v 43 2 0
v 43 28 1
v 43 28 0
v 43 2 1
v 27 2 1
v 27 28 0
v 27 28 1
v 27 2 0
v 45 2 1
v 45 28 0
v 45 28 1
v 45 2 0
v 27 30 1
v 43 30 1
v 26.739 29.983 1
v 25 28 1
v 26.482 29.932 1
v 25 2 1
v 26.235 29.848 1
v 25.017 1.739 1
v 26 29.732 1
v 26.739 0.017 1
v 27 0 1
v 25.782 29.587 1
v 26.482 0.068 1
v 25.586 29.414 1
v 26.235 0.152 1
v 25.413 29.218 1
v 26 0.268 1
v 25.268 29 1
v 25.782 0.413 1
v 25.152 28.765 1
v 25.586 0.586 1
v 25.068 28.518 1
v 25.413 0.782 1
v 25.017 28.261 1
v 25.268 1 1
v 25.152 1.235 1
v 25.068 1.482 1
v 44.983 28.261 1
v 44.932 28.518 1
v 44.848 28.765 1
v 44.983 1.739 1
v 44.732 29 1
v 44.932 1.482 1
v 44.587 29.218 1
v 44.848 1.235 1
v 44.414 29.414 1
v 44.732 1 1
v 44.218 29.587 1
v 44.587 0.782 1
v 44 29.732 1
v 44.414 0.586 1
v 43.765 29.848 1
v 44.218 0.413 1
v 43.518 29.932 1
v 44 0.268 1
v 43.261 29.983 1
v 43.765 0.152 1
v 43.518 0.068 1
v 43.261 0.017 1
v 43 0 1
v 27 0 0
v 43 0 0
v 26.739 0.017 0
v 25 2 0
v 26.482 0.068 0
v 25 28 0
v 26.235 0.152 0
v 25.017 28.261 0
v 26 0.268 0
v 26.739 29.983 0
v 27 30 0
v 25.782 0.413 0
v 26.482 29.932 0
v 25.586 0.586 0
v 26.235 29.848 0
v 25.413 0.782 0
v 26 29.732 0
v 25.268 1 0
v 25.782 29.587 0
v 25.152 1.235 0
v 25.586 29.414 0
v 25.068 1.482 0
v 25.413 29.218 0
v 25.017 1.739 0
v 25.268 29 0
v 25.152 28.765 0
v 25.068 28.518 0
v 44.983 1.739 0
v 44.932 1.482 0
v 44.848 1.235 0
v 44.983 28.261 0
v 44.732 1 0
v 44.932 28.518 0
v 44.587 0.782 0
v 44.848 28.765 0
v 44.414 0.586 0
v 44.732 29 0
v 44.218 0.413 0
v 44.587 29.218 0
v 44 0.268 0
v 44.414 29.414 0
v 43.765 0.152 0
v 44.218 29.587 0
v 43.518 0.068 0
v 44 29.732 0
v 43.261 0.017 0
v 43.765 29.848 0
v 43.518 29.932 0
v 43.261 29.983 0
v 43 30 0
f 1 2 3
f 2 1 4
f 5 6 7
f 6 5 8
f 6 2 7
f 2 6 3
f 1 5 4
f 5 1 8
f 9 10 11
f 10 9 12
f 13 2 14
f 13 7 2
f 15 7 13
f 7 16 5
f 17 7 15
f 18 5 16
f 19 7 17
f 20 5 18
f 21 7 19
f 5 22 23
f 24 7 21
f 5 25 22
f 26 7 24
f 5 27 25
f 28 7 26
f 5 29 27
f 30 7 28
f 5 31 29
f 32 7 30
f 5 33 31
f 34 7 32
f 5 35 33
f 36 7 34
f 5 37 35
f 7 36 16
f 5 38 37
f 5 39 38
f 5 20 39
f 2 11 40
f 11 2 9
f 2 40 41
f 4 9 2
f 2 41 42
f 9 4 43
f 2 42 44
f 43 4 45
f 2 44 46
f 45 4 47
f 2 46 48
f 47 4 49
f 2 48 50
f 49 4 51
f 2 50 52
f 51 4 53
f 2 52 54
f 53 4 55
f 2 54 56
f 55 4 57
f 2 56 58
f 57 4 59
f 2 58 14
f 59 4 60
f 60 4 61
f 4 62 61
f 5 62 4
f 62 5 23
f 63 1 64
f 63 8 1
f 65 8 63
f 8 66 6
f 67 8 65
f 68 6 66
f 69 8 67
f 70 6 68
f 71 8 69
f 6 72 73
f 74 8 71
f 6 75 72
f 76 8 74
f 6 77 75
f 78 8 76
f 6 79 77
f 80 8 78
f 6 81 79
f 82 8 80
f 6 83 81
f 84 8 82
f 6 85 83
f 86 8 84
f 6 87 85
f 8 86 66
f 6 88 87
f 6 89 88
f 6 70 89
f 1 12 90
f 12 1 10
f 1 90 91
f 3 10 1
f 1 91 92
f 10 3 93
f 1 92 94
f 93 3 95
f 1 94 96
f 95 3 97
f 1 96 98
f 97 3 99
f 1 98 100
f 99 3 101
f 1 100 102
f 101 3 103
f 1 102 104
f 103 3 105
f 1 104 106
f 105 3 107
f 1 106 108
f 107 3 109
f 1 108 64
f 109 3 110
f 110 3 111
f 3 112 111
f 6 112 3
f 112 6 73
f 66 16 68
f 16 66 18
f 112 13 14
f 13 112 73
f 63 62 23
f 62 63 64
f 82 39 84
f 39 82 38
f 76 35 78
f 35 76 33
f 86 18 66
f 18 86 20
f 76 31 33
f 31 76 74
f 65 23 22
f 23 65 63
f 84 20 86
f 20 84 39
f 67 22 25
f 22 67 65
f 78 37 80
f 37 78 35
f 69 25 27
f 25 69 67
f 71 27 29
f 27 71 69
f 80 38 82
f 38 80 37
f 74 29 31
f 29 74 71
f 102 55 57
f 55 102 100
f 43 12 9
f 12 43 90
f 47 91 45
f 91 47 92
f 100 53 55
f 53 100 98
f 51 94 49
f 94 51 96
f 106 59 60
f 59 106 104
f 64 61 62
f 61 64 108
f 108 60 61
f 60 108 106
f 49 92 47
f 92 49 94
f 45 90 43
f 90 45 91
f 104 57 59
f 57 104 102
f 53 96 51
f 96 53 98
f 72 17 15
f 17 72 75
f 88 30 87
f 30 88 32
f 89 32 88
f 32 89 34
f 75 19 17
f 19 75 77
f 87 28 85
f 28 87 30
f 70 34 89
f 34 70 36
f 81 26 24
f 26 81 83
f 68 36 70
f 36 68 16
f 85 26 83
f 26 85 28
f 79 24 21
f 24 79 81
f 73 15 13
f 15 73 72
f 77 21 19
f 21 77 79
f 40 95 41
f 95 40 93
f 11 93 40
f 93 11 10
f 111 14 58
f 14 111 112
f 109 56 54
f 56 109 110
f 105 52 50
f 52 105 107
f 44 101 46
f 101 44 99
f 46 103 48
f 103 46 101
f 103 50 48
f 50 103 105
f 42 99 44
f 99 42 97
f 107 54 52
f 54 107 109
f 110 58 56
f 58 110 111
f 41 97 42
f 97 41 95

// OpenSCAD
// minimum angle
$fa = 1;
// minimum size
$fs = 0.4;
// number of fragments 
$fn = 48;

// use <sector.scad>;

// cylindersector(50, 10, 10, a1=0, a2="", tolerance=0) ;
    
// translate([+86,+40,0]) frame(20,30, height=1, inset=0, cornerspace=8, cornerarch=true, cornerinsidearch=false);

// translate([-25,0,0]) frame(20,30, thickness=1, height=1, inset=0, cornerspace=0, cornerarch=false, cornerinsidearch=false);

// frame(20,30, thickness=1, height=1, inset=0, cornerspace=2, cornerarch=false, cornerinsidearch=false);

// When the thickness gets too large, a tiny amount is left in the centre of the circle and causes a rendering error.
translate([25,0,0]) frame(20,30, thickness=2, height=1, inset=0, cornerspace=2, cornerarch=true, cornerinsidearch=true);

// translate([50,0,0]) frame(20,30, thickness=3, height=1, inset=0, cornerspace=6, cornerarch=true, cornerinsidearch=true);

// translate([-25,40,0]) frame(20,30, thickness=1, height=1, inset=3, cornerspace=0, cornerarch=false, cornerinsidearch=false);

// translate([0,40,0]) frame(20,30, thickness=1, height=1, inset=3, cornerspace=2, cornerarch=false, cornerinsidearch=false);

// translate([25,40,0]) frame(20,30, thickness=1, height=1, inset=3, cornerspace=2, cornerarch=true, cornerinsidearch=false);

// translate([50,40,0]) frame(20,30, thickness=3, height=1, inset=3, cornerspace=6, cornerarch=true, cornerinsidearch=true);


module frame(x,y,thickness="", height=1, inset=0, cornerspace=2, cornerarch=true, cornerinsidearch=false) {  
    if (thickness != "" && thickness>cornerspace) {
    echo("you'll get errors in rendering.");
        // When the thickness gets too large, a tiny amount is left in the centre of the circle and causes a rendering error.

    };
    XX=x-2*inset;
    YY=y-2*inset;
    translate([inset,inset,0]) {
    difference() {
        union() {
            difference() {
                cube([XX, YY,height]);
                //translate([-1,-1,-1]) cube([thickness+1,thickness+1,height+2]);                   
            };
        };
        union() {
            if (thickness != "") {
            // cut the middle frame
            translate([thickness, thickness, -5]) 
            cube([
                XX-2*thickness,
                YY-2*thickness,
                height+10]);
            };
            //cut edges
            if (cornerspace>0) {
                rectangleOfCubes(XX, YY, z=10, d=cornerspace, dx=0, dy=0, 
                n=4, ddx=0, ddy=0, inch=false);          
            };
        };
    };
    if (cornerarch && cornerspace>0) {
       // translate([inset,inset,0]) color("red") difference() {
                // cylinder(r=1,h=height);
                // cube([thickness,thickness,height+1]); 
        makeTubes();
    };    
    };
    module makeTubes() {
        rectangleOfTubes(XX, YY, z=height, d=cornerspace, d2=(cornerinsidearch? cornerspace-thickness : 0), dx=0, dy=0, 
                n=4, ddx=0, ddy=0, inch=false);    
    };
};
// tube(savequadrant=3,center=false,r=4,wall=1, h=1);


module rectangleOfTubes(x, y, z=10, d=2.5, d2=1, dx=0, dy=0, n=4, ddx=0, ddy=0, inch=false) {
    rectangleOfObjects(x, y, z=z, d=d, d2=d2, dx=dx, dy=dy, n=n, ddx=ddx, ddy=ddy, inch=inch, type="tube");
};

module rectangleOfCubes(x, y, z=10, d=2.5, dx=0, dy=0, n=4, ddx=0, ddy=0, inch=false) {
    rectangleOfObjects(x, y, z=z, d=d, dx=dx, dy=dy, n=n, ddx=ddx, ddy=ddy, inch=inch, type="cube");
};

module rectangleOfCylinders(x, y, z=10, d=2.5, dx=0, dy=0, n=4, ddx=0, ddy=0, inch=false) {
    rectangleOfObjects(x, y, z=z, d=d, dx=dx, dy=dy, n=n, ddx=ddx, ddy=ddy, inch=inch, type="cylinder");
};


module rectangleOfObjects(x, y, z=10, d=2.5, dx=0, dy=0, n=4, ddx=0, ddy=0, inch=false, type="cylinder", d2=1) {
/*
    x,y: size of board (specify hole offset with dx, dy)
         or: size of rectangle of holes (dx=dy=0)
             specifiy offset with ddx, ddy.
    n:   number of cylinders to make
    inch: values for x,y,dx,dy,ddx,ddy are specified in tenth of inch.
    d:   diameter of cylinders (always in mm)
    z:   height of cylinder (always in mm)
*/    
    if (inch) {
        inch=25.4/10;
        makeSet(x*inch, y*inch, 
            z=z, d=d, 
            dx=dx*inch, 
            dy=(dy>0 ? dy*inch : dx*inch),
            n=n, 
            ddx=ddx*inch, 
            ddy=(ddy>0 ? ddy*inch : ddx*inch),
            type=type
        );
    } else {
        makeSet(x, y, z=z, d=d, 
        dx=dx, 
        dy=(dy>0 ? dy : dx),
        n=n, 
        ddx=ddx, 
        ddy=(ddy>0 ? ddy : ddx),
        type=type
        );
    };

    module makeSet(x, y, z=10, d=2.5, dx=0, dy=0, n=4, ddx=0, ddy=0,type="cylinder") {
        translate([ddx,ddy,-z/2]) {
            translate([0+dx,0+dy,0]) makeObject(0,0) ; 
            if (n>1)
                translate([x-dx,0+dy,0]) makeObject(1,0) ; 
            if (n>2)
                translate([0+dx,y-dy,0]) makeObject(0,1) ; 
            if (n>3)
                translate([x-dx,y-dy,0]) makeObject(1,1) ; 
        };

        module makeObject(xo=0,yo=0) {
            if (type=="cylinder")
                cylinder(z, r=d/2); 
            if (type=="cube")
                translate([0,0,z/2]) cube([2*d,2*d,z],center=true);
            if (type=="tube")
                translate([-xo*2*d,-yo*2*d,z/2]) tube(r=d, s=d2, h=z, center=false, xo=xo, yo=yo);            
        };

    };
};

module tube_old(
    h=10,r1="undef", r2="undef", r=2,
    h2="undef", s1="undef", s2="undef", s="",
    center=true, cutquadrant=0, savequadrant=0, wall="",
    xo=0, yo=0
    ) {
        tolerance=1;
        ttolerance=2;
        quadrantarray = [[3,2],[4,1]];
        savequadrant = quadrantarray[xo][yo];
    translate([center ? 0 : r, center ? 0 : r,0]) difference() {
        cylinder(
            h, r1=(r1 != "undef" ? r1 : r), r2=(r2 != "undef" ? r2 : r));
        union() {
            translate([0,0,-tolerance]) cylinder(
                (h2 != "undef"? h2 : h+ttolerance), 
                r1=(s1 != "undef" ? s1 : (s!=""? s : (wall!=""? r-wall : r/2))), 
                r2=(s2 != "undef" ? s2 : (s!=""? s : (wall!=""? r-wall : r/2)))
            );
            if (cutquadrant>0 || savequadrant>0) {
                cutquadrant();
            };
        };
    };
    module cutquadrant() {
        if (cutquadrant==1 || (savequadrant > 0 && savequadrant != 1))
        translate([-tolerance,0,-tolerance]) cube([r,r,h+ttolerance]) ;
        if (cutquadrant==2 || (savequadrant > 0 && savequadrant != 2))
        translate([-r,0,-tolerance]) cube([r,r,h+ttolerance]) ;
        if (cutquadrant==3 || (savequadrant > 0 && savequadrant != 3))
        translate([-r,-r,-tolerance]) cube([r,r,h+ttolerance]) ;
        if (cutquadrant==4 || (savequadrant > 0 && savequadrant != 4))
        translate([0,-r,-tolerance]) cube([r,r,h+ttolerance]) ;
    };
};

module tube(
    h=10,r1="undef", r2="undef", r=2,
    h2="undef", s1="undef", s2="undef", s="",
    center=true, cutquadrant=0, savequadrant=0, wall="",
    xo=0, yo=0
    ) {
        tolerance=1;
        ttolerance=2;
        // quadrantarray = [[3,2],[4,1]];
        // savequadrant = quadrantarray[xo][yo];
        quadrantarray = [[+2,1],[+3,+0]];
        savequadrant = quadrantarray[xo][yo];
        translate([center ? 0 : r, center ? 0 : r,0]) 
        difference() {
        cylindersector(
            h, r1=(r1 != "undef" ? r1 : r), r2=(r2 != "undef" ? r2 : r), 
            a1=90*savequadrant, tolerance=1);
        union() {
            translate([0,0,-tolerance]) cylindersector(
                (h2 != "undef"? h2 : h+ttolerance), 
                r1=(s1 != "undef" ? s1 : (s!=""? s : (wall!=""? r-wall : r/2))), 
                r2=(s2 != "undef" ? s2 : (s!=""? s : (wall!=""? r-wall : r/2))),
            a1=90*savequadrant, tolerance=+2
            );
            
        };
    };    
};

/*
module cutquadrant() {
        if (cutquadrant==1 || (savequadrant > 0 && savequadrant != 1))
        translate([-tolerance,0,-tolerance]) cube([r,r,h+ttolerance]) ;
        if (cutquadrant==2 || (savequadrant > 0 && savequadrant != 2))
        translate([-r,0,-tolerance]) cube([r,r,h+ttolerance]) ;
        if (cutquadrant==3 || (savequadrant > 0 && savequadrant != 3))
        translate([-r,-r,-tolerance]) cube([r,r,h+ttolerance]) ;
        if (cutquadrant==4 || (savequadrant > 0 && savequadrant != 4))
        translate([0,-r,-tolerance]) cube([r,r,h+ttolerance]) ;
    };
*/

// Inspired by https://gist.github.com/plumbum/78e3c8281e1c031601456df2aa8e37c6

module cylindersector(h, r1=10, r2=10, a1="", a2="", tolerance=0) {
    if (a1=="") {
         cylinder(h=h, r1=r1, r2=r2);
    } else {
        a2x = (a2!=""? a2 : a1 + 90)+tolerance;
        a1x = a1 - tolerance;
        if (a2x - a1x > 180) {
            difference() {
                cylinder(h=h, r1=r1, r2=r2);
                translate([0,0,-0.5]) cylindersector(h=h+1, r1=r1, r2=r2, a2x-360, a1x); 
            }
        } else {
            difference() {
                cylinder(h=h, r1=r1, r2=r2);
                rotate([0,0,a1x]) translate([-r1, -r1, -0.5])
                    cube([r1*2, r1, h+1]);
                rotate([0,0,a2x]) translate([-r1, 0, -0.5])
                    cube([r1*2, r1, h+1]);
            }
//   color("red")     rotate([0,0,a1x]) translate([-r1, -r1, -0.5]) cube([r1*2, r1, h+1]);
// color("green") rotate([0,0,a2x]) translate([-r1, 0, -0.5]) cube([r1*2, r1, h+1]);
        }
};
}    


module sectordh(h, d, a1, a2) {
    if (a2 - a1 > 180) {
        difference() {
            cylinder(h=h, d=d);
            translate([0,0,-0.5]) sector(h+1, d+1, a2-360, a1); 
        }
    } else {
        difference() {
            cylinder(h=h, d=d);
            rotate([0,0,a1]) translate([-d/2, -d/2, -0.5])
                cube([d, d/2, h+1]);
            rotate([0,0,a2]) translate([-d/2, 0, -0.5])
                cube([d, d/2, h+1]);
        }
    }
}    
